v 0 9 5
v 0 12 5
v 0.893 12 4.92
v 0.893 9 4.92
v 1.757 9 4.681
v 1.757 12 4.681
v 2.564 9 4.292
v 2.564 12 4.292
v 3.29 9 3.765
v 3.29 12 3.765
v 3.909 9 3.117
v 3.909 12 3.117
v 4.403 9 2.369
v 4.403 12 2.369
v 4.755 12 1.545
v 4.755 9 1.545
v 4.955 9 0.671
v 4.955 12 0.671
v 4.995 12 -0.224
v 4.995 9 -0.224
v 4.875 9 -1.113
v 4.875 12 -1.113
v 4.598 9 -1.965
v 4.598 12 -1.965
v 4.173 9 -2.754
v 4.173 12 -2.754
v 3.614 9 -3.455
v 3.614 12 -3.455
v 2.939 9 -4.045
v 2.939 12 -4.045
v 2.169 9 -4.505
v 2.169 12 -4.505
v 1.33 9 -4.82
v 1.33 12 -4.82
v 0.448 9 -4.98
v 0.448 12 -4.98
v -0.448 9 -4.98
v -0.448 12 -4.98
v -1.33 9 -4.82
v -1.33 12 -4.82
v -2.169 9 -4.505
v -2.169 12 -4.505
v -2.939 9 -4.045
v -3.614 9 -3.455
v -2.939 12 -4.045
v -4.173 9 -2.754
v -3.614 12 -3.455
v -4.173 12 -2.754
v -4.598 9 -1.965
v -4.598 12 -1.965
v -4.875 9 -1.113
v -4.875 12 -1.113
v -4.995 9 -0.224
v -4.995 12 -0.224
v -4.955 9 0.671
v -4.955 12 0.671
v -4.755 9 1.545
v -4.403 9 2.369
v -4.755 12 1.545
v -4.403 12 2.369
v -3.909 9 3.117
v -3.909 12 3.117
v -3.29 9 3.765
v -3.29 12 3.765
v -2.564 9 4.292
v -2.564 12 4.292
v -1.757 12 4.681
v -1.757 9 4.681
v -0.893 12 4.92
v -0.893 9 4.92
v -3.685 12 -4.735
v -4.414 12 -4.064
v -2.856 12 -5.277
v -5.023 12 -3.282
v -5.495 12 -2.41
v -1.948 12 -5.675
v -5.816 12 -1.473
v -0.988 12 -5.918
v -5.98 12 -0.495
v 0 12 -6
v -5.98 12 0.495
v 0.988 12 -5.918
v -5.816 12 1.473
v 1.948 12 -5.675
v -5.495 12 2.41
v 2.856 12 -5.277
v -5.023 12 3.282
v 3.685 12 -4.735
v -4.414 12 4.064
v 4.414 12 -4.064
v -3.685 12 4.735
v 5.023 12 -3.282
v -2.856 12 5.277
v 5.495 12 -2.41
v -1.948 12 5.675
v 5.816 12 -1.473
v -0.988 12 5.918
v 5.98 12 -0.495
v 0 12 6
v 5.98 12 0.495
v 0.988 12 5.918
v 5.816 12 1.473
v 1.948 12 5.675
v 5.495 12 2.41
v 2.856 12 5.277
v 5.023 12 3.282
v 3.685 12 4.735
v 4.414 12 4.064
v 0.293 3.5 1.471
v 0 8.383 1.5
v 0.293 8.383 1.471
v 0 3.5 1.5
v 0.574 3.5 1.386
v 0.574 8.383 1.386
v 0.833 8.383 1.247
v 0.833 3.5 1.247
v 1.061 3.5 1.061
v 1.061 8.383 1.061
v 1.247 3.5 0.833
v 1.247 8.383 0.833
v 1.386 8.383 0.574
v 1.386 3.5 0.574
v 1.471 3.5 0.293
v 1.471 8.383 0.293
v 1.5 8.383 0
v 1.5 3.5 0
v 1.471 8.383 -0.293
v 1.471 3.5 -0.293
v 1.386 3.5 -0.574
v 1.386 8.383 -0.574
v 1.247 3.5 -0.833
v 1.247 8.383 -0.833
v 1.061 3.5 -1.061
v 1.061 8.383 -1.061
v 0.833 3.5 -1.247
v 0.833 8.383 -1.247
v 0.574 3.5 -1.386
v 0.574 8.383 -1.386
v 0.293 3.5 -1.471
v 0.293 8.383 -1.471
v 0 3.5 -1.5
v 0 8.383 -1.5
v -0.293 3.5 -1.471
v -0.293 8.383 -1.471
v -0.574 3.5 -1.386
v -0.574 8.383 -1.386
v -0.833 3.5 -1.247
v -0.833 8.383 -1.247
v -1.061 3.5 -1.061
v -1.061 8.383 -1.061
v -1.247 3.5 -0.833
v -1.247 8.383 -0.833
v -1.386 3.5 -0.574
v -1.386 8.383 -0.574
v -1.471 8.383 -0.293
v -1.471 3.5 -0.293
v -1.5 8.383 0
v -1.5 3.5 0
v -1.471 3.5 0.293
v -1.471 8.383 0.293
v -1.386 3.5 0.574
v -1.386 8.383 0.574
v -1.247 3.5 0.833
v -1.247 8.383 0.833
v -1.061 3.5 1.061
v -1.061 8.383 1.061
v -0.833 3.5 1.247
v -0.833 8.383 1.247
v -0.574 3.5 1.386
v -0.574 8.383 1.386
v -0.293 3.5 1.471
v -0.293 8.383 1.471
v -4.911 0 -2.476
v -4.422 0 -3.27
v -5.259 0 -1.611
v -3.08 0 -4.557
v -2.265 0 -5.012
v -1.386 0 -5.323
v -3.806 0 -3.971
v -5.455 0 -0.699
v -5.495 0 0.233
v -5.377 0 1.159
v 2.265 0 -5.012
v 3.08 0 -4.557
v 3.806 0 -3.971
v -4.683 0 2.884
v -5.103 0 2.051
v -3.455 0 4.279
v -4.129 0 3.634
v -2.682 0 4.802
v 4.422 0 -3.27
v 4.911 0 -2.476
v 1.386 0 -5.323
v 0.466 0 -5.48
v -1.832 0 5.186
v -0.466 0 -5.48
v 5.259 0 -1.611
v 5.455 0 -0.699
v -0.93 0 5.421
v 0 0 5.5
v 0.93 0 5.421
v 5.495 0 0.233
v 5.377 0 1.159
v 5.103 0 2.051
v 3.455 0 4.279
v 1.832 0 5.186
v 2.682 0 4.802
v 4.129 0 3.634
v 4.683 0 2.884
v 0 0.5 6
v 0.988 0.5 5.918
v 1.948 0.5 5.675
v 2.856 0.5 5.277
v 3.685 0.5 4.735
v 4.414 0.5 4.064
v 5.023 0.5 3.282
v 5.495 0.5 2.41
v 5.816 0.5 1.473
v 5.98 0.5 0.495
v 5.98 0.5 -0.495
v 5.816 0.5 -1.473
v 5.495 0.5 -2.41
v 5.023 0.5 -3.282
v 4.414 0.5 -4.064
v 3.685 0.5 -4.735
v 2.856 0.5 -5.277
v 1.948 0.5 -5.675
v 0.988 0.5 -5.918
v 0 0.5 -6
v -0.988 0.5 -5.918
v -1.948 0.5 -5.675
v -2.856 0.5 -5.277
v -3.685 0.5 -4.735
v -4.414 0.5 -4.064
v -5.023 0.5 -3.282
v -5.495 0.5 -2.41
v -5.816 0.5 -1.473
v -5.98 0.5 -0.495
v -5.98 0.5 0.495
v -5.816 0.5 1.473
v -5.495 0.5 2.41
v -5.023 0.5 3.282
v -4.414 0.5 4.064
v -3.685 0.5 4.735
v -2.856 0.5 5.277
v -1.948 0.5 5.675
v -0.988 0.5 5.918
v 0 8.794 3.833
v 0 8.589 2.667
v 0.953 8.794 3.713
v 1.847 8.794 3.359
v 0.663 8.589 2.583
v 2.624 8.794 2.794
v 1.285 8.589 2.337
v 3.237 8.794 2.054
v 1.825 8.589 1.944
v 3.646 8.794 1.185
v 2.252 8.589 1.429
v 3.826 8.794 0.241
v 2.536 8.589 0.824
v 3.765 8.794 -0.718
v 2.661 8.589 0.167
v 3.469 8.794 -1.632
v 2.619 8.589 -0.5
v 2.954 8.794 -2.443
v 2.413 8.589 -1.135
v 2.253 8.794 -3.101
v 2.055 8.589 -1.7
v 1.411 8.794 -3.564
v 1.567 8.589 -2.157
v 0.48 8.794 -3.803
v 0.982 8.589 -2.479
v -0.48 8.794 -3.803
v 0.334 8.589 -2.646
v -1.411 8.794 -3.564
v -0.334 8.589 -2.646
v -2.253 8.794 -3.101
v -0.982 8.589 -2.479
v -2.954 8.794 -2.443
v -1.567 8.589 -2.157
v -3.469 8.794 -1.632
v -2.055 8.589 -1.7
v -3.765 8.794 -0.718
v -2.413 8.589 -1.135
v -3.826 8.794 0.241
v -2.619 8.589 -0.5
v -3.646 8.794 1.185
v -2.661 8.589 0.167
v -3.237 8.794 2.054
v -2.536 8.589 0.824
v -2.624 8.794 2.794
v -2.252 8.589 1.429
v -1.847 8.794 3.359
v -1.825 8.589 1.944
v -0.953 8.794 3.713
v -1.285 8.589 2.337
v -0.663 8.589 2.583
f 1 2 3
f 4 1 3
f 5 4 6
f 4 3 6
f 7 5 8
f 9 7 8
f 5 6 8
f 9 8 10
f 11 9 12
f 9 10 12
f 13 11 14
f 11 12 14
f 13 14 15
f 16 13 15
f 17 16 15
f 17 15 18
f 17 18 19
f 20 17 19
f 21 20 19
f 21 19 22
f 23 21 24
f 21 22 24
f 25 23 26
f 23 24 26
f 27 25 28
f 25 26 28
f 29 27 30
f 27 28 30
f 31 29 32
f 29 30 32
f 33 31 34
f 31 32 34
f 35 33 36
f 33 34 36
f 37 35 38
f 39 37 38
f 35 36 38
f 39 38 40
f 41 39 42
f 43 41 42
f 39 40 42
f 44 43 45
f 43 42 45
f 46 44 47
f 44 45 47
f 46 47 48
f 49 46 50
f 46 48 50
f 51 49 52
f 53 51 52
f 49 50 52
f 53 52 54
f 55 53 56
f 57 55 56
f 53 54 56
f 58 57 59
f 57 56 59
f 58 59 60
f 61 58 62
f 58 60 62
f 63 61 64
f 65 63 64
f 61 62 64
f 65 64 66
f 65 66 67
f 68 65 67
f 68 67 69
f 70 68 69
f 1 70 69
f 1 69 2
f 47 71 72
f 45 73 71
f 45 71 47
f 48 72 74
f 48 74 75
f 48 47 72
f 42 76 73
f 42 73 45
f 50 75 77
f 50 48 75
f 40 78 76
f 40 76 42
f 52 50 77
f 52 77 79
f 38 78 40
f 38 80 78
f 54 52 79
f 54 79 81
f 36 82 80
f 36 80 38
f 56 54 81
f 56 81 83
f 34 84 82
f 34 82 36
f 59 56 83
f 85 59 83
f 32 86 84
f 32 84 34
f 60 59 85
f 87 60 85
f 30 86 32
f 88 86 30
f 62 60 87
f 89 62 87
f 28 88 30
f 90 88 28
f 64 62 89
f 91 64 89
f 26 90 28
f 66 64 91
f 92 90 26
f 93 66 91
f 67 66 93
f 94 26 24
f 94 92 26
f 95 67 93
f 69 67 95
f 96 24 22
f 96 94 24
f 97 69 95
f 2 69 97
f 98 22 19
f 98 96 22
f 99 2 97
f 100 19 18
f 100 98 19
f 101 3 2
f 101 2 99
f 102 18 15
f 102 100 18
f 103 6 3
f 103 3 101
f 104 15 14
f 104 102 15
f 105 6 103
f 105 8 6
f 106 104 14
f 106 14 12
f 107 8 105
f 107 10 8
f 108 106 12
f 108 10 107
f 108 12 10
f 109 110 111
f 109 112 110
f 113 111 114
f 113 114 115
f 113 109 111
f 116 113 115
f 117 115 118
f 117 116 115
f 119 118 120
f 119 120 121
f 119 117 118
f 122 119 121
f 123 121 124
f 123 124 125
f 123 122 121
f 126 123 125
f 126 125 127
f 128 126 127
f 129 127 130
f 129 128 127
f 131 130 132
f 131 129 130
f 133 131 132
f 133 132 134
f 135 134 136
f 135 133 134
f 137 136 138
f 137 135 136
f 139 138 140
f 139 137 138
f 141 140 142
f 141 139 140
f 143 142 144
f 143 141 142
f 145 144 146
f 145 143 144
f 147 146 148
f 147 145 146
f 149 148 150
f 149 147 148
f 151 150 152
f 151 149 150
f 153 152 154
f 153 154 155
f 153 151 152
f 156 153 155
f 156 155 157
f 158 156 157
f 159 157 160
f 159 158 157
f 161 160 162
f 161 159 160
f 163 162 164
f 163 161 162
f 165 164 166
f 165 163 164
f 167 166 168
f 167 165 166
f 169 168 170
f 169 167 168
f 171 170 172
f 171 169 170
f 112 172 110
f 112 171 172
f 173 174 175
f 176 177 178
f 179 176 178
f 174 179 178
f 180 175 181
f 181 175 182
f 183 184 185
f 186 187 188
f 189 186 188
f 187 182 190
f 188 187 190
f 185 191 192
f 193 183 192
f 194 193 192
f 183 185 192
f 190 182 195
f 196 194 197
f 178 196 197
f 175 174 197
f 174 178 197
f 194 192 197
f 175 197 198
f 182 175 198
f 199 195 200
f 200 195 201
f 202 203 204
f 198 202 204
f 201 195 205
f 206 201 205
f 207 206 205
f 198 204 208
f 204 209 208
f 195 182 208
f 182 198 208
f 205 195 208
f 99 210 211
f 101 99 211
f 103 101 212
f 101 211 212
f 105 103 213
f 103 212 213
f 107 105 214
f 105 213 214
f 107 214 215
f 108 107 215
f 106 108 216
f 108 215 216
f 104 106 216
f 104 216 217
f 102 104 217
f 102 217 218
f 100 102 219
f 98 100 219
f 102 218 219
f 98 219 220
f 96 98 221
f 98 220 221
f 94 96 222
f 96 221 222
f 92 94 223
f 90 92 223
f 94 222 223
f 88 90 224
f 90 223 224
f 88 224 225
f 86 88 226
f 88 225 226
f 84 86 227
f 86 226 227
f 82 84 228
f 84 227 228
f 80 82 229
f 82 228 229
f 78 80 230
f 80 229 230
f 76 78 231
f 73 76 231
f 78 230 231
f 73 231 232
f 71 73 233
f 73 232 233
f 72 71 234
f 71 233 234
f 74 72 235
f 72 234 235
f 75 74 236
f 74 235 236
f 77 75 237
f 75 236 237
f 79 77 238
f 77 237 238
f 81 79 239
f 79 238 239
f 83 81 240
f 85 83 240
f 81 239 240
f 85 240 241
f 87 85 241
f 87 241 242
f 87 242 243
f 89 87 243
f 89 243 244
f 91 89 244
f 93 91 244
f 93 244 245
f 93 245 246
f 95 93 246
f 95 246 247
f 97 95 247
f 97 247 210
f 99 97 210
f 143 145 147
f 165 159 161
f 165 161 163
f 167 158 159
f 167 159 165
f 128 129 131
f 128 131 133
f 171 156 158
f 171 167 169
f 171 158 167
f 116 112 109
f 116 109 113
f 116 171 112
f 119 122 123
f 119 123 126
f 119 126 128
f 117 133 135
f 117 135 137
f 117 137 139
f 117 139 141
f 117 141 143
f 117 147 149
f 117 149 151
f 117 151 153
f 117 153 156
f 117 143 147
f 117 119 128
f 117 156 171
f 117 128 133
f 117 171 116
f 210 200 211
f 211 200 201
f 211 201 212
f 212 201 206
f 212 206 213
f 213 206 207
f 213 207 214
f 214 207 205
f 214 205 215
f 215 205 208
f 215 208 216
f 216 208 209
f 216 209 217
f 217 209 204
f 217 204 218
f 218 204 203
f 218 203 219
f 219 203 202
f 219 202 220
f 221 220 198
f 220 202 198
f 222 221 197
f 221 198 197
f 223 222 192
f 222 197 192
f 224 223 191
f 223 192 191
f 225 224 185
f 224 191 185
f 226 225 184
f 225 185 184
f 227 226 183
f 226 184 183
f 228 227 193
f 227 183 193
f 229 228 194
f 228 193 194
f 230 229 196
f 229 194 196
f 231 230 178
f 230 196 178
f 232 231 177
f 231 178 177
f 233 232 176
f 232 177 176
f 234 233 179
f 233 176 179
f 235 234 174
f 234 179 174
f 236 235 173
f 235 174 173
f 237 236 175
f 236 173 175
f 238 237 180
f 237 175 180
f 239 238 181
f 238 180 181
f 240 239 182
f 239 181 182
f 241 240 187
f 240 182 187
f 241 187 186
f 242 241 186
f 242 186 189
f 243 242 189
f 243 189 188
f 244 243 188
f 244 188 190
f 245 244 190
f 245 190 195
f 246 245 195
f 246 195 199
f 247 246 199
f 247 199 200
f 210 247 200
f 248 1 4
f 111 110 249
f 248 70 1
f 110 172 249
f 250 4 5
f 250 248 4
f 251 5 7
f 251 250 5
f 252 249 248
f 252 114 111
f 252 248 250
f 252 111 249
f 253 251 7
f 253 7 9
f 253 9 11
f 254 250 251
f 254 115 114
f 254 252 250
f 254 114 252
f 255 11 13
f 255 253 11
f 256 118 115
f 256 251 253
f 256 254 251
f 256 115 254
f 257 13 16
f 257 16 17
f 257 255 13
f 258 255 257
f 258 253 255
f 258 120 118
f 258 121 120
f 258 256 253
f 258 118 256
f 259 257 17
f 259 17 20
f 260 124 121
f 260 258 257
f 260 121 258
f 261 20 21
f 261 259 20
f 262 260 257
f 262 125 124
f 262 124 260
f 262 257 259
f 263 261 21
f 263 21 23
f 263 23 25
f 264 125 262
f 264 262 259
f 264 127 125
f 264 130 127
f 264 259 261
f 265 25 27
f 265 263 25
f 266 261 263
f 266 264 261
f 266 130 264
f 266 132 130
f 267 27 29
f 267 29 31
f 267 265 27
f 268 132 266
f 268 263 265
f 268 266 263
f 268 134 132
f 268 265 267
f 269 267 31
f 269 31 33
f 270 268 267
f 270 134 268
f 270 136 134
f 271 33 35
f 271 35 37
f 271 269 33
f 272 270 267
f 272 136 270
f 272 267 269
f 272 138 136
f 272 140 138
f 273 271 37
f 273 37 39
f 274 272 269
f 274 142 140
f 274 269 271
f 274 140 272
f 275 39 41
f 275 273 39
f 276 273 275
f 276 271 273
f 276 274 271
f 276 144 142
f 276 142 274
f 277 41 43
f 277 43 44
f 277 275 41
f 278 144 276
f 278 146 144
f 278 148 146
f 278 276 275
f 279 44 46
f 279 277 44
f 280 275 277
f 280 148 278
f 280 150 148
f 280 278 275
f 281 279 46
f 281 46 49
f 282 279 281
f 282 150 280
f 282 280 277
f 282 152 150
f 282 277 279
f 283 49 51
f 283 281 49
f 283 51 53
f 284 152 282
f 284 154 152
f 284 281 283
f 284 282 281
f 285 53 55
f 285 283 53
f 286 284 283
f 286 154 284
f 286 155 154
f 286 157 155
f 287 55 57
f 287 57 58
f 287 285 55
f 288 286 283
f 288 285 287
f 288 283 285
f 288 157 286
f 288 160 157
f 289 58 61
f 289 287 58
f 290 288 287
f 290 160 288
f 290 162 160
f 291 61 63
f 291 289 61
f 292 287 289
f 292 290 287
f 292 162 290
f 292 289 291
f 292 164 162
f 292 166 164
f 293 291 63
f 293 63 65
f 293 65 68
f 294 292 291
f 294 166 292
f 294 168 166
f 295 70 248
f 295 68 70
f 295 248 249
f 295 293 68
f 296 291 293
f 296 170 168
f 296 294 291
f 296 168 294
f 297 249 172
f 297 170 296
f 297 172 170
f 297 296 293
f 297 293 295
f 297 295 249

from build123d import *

# Parameters (mm, degrees)
SKETCH1_R           = 6
BOSS_EXTRUDE1_DEPTH = 12
SKETCH2_R           = 5
CUT_EXTRUDE1_DEPTH  = 3
CHAMFER1_SIZE       = 0.5


with BuildPart() as part:
    # Sketch1 → Boss-Extrude1 (new body)
    with BuildSketch(Plane(origin=(0, 0, 0), x_dir=(1, 0, 0), z_dir=(0, 1, 0))):
        with Locations(Location((0, 0, 0), (0, 0, 270))):
            Circle(SKETCH1_R)
    extrude(amount=BOSS_EXTRUDE1_DEPTH)

    # Sketch2 → Cut-Extrude1 (cut)
    with BuildSketch(Plane(origin=(0, 12, 0), x_dir=(1, 0, 0), z_dir=(0, 1, 0))):
        with Locations(Location((0, 0, 0), (0, 0, 270))):
            Circle(SKETCH2_R)
    extrude(amount=-CUT_EXTRUDE1_DEPTH, mode=Mode.SUBTRACT)

    # Sketch3 → Cut-Revolve1 (revolve, cut)
    with BuildSketch(Plane.XY, mode=Mode.PRIVATE) as cut_revolve1_sk:
        Polygon((-5, 9), (-1.5, 8.382855568), (-1.5, 3.5), (0, 3.5), (0, 9), align=None)
    revolve(cut_revolve1_sk.sketch.rotate(Axis((0, 3.5, 0), (0, 1, 0)), 90), axis=Axis((0, 3.5, 0), (0, 1, 0)), mode=Mode.SUBTRACT)

    # Chamfer1
    chamfer1_edges = [part.edges().sort_by_distance(p)[0] for p in [
        (0, 0, -6),
    ]]
    chamfer(chamfer1_edges, length=CHAMFER1_SIZE)


solid = part.part
